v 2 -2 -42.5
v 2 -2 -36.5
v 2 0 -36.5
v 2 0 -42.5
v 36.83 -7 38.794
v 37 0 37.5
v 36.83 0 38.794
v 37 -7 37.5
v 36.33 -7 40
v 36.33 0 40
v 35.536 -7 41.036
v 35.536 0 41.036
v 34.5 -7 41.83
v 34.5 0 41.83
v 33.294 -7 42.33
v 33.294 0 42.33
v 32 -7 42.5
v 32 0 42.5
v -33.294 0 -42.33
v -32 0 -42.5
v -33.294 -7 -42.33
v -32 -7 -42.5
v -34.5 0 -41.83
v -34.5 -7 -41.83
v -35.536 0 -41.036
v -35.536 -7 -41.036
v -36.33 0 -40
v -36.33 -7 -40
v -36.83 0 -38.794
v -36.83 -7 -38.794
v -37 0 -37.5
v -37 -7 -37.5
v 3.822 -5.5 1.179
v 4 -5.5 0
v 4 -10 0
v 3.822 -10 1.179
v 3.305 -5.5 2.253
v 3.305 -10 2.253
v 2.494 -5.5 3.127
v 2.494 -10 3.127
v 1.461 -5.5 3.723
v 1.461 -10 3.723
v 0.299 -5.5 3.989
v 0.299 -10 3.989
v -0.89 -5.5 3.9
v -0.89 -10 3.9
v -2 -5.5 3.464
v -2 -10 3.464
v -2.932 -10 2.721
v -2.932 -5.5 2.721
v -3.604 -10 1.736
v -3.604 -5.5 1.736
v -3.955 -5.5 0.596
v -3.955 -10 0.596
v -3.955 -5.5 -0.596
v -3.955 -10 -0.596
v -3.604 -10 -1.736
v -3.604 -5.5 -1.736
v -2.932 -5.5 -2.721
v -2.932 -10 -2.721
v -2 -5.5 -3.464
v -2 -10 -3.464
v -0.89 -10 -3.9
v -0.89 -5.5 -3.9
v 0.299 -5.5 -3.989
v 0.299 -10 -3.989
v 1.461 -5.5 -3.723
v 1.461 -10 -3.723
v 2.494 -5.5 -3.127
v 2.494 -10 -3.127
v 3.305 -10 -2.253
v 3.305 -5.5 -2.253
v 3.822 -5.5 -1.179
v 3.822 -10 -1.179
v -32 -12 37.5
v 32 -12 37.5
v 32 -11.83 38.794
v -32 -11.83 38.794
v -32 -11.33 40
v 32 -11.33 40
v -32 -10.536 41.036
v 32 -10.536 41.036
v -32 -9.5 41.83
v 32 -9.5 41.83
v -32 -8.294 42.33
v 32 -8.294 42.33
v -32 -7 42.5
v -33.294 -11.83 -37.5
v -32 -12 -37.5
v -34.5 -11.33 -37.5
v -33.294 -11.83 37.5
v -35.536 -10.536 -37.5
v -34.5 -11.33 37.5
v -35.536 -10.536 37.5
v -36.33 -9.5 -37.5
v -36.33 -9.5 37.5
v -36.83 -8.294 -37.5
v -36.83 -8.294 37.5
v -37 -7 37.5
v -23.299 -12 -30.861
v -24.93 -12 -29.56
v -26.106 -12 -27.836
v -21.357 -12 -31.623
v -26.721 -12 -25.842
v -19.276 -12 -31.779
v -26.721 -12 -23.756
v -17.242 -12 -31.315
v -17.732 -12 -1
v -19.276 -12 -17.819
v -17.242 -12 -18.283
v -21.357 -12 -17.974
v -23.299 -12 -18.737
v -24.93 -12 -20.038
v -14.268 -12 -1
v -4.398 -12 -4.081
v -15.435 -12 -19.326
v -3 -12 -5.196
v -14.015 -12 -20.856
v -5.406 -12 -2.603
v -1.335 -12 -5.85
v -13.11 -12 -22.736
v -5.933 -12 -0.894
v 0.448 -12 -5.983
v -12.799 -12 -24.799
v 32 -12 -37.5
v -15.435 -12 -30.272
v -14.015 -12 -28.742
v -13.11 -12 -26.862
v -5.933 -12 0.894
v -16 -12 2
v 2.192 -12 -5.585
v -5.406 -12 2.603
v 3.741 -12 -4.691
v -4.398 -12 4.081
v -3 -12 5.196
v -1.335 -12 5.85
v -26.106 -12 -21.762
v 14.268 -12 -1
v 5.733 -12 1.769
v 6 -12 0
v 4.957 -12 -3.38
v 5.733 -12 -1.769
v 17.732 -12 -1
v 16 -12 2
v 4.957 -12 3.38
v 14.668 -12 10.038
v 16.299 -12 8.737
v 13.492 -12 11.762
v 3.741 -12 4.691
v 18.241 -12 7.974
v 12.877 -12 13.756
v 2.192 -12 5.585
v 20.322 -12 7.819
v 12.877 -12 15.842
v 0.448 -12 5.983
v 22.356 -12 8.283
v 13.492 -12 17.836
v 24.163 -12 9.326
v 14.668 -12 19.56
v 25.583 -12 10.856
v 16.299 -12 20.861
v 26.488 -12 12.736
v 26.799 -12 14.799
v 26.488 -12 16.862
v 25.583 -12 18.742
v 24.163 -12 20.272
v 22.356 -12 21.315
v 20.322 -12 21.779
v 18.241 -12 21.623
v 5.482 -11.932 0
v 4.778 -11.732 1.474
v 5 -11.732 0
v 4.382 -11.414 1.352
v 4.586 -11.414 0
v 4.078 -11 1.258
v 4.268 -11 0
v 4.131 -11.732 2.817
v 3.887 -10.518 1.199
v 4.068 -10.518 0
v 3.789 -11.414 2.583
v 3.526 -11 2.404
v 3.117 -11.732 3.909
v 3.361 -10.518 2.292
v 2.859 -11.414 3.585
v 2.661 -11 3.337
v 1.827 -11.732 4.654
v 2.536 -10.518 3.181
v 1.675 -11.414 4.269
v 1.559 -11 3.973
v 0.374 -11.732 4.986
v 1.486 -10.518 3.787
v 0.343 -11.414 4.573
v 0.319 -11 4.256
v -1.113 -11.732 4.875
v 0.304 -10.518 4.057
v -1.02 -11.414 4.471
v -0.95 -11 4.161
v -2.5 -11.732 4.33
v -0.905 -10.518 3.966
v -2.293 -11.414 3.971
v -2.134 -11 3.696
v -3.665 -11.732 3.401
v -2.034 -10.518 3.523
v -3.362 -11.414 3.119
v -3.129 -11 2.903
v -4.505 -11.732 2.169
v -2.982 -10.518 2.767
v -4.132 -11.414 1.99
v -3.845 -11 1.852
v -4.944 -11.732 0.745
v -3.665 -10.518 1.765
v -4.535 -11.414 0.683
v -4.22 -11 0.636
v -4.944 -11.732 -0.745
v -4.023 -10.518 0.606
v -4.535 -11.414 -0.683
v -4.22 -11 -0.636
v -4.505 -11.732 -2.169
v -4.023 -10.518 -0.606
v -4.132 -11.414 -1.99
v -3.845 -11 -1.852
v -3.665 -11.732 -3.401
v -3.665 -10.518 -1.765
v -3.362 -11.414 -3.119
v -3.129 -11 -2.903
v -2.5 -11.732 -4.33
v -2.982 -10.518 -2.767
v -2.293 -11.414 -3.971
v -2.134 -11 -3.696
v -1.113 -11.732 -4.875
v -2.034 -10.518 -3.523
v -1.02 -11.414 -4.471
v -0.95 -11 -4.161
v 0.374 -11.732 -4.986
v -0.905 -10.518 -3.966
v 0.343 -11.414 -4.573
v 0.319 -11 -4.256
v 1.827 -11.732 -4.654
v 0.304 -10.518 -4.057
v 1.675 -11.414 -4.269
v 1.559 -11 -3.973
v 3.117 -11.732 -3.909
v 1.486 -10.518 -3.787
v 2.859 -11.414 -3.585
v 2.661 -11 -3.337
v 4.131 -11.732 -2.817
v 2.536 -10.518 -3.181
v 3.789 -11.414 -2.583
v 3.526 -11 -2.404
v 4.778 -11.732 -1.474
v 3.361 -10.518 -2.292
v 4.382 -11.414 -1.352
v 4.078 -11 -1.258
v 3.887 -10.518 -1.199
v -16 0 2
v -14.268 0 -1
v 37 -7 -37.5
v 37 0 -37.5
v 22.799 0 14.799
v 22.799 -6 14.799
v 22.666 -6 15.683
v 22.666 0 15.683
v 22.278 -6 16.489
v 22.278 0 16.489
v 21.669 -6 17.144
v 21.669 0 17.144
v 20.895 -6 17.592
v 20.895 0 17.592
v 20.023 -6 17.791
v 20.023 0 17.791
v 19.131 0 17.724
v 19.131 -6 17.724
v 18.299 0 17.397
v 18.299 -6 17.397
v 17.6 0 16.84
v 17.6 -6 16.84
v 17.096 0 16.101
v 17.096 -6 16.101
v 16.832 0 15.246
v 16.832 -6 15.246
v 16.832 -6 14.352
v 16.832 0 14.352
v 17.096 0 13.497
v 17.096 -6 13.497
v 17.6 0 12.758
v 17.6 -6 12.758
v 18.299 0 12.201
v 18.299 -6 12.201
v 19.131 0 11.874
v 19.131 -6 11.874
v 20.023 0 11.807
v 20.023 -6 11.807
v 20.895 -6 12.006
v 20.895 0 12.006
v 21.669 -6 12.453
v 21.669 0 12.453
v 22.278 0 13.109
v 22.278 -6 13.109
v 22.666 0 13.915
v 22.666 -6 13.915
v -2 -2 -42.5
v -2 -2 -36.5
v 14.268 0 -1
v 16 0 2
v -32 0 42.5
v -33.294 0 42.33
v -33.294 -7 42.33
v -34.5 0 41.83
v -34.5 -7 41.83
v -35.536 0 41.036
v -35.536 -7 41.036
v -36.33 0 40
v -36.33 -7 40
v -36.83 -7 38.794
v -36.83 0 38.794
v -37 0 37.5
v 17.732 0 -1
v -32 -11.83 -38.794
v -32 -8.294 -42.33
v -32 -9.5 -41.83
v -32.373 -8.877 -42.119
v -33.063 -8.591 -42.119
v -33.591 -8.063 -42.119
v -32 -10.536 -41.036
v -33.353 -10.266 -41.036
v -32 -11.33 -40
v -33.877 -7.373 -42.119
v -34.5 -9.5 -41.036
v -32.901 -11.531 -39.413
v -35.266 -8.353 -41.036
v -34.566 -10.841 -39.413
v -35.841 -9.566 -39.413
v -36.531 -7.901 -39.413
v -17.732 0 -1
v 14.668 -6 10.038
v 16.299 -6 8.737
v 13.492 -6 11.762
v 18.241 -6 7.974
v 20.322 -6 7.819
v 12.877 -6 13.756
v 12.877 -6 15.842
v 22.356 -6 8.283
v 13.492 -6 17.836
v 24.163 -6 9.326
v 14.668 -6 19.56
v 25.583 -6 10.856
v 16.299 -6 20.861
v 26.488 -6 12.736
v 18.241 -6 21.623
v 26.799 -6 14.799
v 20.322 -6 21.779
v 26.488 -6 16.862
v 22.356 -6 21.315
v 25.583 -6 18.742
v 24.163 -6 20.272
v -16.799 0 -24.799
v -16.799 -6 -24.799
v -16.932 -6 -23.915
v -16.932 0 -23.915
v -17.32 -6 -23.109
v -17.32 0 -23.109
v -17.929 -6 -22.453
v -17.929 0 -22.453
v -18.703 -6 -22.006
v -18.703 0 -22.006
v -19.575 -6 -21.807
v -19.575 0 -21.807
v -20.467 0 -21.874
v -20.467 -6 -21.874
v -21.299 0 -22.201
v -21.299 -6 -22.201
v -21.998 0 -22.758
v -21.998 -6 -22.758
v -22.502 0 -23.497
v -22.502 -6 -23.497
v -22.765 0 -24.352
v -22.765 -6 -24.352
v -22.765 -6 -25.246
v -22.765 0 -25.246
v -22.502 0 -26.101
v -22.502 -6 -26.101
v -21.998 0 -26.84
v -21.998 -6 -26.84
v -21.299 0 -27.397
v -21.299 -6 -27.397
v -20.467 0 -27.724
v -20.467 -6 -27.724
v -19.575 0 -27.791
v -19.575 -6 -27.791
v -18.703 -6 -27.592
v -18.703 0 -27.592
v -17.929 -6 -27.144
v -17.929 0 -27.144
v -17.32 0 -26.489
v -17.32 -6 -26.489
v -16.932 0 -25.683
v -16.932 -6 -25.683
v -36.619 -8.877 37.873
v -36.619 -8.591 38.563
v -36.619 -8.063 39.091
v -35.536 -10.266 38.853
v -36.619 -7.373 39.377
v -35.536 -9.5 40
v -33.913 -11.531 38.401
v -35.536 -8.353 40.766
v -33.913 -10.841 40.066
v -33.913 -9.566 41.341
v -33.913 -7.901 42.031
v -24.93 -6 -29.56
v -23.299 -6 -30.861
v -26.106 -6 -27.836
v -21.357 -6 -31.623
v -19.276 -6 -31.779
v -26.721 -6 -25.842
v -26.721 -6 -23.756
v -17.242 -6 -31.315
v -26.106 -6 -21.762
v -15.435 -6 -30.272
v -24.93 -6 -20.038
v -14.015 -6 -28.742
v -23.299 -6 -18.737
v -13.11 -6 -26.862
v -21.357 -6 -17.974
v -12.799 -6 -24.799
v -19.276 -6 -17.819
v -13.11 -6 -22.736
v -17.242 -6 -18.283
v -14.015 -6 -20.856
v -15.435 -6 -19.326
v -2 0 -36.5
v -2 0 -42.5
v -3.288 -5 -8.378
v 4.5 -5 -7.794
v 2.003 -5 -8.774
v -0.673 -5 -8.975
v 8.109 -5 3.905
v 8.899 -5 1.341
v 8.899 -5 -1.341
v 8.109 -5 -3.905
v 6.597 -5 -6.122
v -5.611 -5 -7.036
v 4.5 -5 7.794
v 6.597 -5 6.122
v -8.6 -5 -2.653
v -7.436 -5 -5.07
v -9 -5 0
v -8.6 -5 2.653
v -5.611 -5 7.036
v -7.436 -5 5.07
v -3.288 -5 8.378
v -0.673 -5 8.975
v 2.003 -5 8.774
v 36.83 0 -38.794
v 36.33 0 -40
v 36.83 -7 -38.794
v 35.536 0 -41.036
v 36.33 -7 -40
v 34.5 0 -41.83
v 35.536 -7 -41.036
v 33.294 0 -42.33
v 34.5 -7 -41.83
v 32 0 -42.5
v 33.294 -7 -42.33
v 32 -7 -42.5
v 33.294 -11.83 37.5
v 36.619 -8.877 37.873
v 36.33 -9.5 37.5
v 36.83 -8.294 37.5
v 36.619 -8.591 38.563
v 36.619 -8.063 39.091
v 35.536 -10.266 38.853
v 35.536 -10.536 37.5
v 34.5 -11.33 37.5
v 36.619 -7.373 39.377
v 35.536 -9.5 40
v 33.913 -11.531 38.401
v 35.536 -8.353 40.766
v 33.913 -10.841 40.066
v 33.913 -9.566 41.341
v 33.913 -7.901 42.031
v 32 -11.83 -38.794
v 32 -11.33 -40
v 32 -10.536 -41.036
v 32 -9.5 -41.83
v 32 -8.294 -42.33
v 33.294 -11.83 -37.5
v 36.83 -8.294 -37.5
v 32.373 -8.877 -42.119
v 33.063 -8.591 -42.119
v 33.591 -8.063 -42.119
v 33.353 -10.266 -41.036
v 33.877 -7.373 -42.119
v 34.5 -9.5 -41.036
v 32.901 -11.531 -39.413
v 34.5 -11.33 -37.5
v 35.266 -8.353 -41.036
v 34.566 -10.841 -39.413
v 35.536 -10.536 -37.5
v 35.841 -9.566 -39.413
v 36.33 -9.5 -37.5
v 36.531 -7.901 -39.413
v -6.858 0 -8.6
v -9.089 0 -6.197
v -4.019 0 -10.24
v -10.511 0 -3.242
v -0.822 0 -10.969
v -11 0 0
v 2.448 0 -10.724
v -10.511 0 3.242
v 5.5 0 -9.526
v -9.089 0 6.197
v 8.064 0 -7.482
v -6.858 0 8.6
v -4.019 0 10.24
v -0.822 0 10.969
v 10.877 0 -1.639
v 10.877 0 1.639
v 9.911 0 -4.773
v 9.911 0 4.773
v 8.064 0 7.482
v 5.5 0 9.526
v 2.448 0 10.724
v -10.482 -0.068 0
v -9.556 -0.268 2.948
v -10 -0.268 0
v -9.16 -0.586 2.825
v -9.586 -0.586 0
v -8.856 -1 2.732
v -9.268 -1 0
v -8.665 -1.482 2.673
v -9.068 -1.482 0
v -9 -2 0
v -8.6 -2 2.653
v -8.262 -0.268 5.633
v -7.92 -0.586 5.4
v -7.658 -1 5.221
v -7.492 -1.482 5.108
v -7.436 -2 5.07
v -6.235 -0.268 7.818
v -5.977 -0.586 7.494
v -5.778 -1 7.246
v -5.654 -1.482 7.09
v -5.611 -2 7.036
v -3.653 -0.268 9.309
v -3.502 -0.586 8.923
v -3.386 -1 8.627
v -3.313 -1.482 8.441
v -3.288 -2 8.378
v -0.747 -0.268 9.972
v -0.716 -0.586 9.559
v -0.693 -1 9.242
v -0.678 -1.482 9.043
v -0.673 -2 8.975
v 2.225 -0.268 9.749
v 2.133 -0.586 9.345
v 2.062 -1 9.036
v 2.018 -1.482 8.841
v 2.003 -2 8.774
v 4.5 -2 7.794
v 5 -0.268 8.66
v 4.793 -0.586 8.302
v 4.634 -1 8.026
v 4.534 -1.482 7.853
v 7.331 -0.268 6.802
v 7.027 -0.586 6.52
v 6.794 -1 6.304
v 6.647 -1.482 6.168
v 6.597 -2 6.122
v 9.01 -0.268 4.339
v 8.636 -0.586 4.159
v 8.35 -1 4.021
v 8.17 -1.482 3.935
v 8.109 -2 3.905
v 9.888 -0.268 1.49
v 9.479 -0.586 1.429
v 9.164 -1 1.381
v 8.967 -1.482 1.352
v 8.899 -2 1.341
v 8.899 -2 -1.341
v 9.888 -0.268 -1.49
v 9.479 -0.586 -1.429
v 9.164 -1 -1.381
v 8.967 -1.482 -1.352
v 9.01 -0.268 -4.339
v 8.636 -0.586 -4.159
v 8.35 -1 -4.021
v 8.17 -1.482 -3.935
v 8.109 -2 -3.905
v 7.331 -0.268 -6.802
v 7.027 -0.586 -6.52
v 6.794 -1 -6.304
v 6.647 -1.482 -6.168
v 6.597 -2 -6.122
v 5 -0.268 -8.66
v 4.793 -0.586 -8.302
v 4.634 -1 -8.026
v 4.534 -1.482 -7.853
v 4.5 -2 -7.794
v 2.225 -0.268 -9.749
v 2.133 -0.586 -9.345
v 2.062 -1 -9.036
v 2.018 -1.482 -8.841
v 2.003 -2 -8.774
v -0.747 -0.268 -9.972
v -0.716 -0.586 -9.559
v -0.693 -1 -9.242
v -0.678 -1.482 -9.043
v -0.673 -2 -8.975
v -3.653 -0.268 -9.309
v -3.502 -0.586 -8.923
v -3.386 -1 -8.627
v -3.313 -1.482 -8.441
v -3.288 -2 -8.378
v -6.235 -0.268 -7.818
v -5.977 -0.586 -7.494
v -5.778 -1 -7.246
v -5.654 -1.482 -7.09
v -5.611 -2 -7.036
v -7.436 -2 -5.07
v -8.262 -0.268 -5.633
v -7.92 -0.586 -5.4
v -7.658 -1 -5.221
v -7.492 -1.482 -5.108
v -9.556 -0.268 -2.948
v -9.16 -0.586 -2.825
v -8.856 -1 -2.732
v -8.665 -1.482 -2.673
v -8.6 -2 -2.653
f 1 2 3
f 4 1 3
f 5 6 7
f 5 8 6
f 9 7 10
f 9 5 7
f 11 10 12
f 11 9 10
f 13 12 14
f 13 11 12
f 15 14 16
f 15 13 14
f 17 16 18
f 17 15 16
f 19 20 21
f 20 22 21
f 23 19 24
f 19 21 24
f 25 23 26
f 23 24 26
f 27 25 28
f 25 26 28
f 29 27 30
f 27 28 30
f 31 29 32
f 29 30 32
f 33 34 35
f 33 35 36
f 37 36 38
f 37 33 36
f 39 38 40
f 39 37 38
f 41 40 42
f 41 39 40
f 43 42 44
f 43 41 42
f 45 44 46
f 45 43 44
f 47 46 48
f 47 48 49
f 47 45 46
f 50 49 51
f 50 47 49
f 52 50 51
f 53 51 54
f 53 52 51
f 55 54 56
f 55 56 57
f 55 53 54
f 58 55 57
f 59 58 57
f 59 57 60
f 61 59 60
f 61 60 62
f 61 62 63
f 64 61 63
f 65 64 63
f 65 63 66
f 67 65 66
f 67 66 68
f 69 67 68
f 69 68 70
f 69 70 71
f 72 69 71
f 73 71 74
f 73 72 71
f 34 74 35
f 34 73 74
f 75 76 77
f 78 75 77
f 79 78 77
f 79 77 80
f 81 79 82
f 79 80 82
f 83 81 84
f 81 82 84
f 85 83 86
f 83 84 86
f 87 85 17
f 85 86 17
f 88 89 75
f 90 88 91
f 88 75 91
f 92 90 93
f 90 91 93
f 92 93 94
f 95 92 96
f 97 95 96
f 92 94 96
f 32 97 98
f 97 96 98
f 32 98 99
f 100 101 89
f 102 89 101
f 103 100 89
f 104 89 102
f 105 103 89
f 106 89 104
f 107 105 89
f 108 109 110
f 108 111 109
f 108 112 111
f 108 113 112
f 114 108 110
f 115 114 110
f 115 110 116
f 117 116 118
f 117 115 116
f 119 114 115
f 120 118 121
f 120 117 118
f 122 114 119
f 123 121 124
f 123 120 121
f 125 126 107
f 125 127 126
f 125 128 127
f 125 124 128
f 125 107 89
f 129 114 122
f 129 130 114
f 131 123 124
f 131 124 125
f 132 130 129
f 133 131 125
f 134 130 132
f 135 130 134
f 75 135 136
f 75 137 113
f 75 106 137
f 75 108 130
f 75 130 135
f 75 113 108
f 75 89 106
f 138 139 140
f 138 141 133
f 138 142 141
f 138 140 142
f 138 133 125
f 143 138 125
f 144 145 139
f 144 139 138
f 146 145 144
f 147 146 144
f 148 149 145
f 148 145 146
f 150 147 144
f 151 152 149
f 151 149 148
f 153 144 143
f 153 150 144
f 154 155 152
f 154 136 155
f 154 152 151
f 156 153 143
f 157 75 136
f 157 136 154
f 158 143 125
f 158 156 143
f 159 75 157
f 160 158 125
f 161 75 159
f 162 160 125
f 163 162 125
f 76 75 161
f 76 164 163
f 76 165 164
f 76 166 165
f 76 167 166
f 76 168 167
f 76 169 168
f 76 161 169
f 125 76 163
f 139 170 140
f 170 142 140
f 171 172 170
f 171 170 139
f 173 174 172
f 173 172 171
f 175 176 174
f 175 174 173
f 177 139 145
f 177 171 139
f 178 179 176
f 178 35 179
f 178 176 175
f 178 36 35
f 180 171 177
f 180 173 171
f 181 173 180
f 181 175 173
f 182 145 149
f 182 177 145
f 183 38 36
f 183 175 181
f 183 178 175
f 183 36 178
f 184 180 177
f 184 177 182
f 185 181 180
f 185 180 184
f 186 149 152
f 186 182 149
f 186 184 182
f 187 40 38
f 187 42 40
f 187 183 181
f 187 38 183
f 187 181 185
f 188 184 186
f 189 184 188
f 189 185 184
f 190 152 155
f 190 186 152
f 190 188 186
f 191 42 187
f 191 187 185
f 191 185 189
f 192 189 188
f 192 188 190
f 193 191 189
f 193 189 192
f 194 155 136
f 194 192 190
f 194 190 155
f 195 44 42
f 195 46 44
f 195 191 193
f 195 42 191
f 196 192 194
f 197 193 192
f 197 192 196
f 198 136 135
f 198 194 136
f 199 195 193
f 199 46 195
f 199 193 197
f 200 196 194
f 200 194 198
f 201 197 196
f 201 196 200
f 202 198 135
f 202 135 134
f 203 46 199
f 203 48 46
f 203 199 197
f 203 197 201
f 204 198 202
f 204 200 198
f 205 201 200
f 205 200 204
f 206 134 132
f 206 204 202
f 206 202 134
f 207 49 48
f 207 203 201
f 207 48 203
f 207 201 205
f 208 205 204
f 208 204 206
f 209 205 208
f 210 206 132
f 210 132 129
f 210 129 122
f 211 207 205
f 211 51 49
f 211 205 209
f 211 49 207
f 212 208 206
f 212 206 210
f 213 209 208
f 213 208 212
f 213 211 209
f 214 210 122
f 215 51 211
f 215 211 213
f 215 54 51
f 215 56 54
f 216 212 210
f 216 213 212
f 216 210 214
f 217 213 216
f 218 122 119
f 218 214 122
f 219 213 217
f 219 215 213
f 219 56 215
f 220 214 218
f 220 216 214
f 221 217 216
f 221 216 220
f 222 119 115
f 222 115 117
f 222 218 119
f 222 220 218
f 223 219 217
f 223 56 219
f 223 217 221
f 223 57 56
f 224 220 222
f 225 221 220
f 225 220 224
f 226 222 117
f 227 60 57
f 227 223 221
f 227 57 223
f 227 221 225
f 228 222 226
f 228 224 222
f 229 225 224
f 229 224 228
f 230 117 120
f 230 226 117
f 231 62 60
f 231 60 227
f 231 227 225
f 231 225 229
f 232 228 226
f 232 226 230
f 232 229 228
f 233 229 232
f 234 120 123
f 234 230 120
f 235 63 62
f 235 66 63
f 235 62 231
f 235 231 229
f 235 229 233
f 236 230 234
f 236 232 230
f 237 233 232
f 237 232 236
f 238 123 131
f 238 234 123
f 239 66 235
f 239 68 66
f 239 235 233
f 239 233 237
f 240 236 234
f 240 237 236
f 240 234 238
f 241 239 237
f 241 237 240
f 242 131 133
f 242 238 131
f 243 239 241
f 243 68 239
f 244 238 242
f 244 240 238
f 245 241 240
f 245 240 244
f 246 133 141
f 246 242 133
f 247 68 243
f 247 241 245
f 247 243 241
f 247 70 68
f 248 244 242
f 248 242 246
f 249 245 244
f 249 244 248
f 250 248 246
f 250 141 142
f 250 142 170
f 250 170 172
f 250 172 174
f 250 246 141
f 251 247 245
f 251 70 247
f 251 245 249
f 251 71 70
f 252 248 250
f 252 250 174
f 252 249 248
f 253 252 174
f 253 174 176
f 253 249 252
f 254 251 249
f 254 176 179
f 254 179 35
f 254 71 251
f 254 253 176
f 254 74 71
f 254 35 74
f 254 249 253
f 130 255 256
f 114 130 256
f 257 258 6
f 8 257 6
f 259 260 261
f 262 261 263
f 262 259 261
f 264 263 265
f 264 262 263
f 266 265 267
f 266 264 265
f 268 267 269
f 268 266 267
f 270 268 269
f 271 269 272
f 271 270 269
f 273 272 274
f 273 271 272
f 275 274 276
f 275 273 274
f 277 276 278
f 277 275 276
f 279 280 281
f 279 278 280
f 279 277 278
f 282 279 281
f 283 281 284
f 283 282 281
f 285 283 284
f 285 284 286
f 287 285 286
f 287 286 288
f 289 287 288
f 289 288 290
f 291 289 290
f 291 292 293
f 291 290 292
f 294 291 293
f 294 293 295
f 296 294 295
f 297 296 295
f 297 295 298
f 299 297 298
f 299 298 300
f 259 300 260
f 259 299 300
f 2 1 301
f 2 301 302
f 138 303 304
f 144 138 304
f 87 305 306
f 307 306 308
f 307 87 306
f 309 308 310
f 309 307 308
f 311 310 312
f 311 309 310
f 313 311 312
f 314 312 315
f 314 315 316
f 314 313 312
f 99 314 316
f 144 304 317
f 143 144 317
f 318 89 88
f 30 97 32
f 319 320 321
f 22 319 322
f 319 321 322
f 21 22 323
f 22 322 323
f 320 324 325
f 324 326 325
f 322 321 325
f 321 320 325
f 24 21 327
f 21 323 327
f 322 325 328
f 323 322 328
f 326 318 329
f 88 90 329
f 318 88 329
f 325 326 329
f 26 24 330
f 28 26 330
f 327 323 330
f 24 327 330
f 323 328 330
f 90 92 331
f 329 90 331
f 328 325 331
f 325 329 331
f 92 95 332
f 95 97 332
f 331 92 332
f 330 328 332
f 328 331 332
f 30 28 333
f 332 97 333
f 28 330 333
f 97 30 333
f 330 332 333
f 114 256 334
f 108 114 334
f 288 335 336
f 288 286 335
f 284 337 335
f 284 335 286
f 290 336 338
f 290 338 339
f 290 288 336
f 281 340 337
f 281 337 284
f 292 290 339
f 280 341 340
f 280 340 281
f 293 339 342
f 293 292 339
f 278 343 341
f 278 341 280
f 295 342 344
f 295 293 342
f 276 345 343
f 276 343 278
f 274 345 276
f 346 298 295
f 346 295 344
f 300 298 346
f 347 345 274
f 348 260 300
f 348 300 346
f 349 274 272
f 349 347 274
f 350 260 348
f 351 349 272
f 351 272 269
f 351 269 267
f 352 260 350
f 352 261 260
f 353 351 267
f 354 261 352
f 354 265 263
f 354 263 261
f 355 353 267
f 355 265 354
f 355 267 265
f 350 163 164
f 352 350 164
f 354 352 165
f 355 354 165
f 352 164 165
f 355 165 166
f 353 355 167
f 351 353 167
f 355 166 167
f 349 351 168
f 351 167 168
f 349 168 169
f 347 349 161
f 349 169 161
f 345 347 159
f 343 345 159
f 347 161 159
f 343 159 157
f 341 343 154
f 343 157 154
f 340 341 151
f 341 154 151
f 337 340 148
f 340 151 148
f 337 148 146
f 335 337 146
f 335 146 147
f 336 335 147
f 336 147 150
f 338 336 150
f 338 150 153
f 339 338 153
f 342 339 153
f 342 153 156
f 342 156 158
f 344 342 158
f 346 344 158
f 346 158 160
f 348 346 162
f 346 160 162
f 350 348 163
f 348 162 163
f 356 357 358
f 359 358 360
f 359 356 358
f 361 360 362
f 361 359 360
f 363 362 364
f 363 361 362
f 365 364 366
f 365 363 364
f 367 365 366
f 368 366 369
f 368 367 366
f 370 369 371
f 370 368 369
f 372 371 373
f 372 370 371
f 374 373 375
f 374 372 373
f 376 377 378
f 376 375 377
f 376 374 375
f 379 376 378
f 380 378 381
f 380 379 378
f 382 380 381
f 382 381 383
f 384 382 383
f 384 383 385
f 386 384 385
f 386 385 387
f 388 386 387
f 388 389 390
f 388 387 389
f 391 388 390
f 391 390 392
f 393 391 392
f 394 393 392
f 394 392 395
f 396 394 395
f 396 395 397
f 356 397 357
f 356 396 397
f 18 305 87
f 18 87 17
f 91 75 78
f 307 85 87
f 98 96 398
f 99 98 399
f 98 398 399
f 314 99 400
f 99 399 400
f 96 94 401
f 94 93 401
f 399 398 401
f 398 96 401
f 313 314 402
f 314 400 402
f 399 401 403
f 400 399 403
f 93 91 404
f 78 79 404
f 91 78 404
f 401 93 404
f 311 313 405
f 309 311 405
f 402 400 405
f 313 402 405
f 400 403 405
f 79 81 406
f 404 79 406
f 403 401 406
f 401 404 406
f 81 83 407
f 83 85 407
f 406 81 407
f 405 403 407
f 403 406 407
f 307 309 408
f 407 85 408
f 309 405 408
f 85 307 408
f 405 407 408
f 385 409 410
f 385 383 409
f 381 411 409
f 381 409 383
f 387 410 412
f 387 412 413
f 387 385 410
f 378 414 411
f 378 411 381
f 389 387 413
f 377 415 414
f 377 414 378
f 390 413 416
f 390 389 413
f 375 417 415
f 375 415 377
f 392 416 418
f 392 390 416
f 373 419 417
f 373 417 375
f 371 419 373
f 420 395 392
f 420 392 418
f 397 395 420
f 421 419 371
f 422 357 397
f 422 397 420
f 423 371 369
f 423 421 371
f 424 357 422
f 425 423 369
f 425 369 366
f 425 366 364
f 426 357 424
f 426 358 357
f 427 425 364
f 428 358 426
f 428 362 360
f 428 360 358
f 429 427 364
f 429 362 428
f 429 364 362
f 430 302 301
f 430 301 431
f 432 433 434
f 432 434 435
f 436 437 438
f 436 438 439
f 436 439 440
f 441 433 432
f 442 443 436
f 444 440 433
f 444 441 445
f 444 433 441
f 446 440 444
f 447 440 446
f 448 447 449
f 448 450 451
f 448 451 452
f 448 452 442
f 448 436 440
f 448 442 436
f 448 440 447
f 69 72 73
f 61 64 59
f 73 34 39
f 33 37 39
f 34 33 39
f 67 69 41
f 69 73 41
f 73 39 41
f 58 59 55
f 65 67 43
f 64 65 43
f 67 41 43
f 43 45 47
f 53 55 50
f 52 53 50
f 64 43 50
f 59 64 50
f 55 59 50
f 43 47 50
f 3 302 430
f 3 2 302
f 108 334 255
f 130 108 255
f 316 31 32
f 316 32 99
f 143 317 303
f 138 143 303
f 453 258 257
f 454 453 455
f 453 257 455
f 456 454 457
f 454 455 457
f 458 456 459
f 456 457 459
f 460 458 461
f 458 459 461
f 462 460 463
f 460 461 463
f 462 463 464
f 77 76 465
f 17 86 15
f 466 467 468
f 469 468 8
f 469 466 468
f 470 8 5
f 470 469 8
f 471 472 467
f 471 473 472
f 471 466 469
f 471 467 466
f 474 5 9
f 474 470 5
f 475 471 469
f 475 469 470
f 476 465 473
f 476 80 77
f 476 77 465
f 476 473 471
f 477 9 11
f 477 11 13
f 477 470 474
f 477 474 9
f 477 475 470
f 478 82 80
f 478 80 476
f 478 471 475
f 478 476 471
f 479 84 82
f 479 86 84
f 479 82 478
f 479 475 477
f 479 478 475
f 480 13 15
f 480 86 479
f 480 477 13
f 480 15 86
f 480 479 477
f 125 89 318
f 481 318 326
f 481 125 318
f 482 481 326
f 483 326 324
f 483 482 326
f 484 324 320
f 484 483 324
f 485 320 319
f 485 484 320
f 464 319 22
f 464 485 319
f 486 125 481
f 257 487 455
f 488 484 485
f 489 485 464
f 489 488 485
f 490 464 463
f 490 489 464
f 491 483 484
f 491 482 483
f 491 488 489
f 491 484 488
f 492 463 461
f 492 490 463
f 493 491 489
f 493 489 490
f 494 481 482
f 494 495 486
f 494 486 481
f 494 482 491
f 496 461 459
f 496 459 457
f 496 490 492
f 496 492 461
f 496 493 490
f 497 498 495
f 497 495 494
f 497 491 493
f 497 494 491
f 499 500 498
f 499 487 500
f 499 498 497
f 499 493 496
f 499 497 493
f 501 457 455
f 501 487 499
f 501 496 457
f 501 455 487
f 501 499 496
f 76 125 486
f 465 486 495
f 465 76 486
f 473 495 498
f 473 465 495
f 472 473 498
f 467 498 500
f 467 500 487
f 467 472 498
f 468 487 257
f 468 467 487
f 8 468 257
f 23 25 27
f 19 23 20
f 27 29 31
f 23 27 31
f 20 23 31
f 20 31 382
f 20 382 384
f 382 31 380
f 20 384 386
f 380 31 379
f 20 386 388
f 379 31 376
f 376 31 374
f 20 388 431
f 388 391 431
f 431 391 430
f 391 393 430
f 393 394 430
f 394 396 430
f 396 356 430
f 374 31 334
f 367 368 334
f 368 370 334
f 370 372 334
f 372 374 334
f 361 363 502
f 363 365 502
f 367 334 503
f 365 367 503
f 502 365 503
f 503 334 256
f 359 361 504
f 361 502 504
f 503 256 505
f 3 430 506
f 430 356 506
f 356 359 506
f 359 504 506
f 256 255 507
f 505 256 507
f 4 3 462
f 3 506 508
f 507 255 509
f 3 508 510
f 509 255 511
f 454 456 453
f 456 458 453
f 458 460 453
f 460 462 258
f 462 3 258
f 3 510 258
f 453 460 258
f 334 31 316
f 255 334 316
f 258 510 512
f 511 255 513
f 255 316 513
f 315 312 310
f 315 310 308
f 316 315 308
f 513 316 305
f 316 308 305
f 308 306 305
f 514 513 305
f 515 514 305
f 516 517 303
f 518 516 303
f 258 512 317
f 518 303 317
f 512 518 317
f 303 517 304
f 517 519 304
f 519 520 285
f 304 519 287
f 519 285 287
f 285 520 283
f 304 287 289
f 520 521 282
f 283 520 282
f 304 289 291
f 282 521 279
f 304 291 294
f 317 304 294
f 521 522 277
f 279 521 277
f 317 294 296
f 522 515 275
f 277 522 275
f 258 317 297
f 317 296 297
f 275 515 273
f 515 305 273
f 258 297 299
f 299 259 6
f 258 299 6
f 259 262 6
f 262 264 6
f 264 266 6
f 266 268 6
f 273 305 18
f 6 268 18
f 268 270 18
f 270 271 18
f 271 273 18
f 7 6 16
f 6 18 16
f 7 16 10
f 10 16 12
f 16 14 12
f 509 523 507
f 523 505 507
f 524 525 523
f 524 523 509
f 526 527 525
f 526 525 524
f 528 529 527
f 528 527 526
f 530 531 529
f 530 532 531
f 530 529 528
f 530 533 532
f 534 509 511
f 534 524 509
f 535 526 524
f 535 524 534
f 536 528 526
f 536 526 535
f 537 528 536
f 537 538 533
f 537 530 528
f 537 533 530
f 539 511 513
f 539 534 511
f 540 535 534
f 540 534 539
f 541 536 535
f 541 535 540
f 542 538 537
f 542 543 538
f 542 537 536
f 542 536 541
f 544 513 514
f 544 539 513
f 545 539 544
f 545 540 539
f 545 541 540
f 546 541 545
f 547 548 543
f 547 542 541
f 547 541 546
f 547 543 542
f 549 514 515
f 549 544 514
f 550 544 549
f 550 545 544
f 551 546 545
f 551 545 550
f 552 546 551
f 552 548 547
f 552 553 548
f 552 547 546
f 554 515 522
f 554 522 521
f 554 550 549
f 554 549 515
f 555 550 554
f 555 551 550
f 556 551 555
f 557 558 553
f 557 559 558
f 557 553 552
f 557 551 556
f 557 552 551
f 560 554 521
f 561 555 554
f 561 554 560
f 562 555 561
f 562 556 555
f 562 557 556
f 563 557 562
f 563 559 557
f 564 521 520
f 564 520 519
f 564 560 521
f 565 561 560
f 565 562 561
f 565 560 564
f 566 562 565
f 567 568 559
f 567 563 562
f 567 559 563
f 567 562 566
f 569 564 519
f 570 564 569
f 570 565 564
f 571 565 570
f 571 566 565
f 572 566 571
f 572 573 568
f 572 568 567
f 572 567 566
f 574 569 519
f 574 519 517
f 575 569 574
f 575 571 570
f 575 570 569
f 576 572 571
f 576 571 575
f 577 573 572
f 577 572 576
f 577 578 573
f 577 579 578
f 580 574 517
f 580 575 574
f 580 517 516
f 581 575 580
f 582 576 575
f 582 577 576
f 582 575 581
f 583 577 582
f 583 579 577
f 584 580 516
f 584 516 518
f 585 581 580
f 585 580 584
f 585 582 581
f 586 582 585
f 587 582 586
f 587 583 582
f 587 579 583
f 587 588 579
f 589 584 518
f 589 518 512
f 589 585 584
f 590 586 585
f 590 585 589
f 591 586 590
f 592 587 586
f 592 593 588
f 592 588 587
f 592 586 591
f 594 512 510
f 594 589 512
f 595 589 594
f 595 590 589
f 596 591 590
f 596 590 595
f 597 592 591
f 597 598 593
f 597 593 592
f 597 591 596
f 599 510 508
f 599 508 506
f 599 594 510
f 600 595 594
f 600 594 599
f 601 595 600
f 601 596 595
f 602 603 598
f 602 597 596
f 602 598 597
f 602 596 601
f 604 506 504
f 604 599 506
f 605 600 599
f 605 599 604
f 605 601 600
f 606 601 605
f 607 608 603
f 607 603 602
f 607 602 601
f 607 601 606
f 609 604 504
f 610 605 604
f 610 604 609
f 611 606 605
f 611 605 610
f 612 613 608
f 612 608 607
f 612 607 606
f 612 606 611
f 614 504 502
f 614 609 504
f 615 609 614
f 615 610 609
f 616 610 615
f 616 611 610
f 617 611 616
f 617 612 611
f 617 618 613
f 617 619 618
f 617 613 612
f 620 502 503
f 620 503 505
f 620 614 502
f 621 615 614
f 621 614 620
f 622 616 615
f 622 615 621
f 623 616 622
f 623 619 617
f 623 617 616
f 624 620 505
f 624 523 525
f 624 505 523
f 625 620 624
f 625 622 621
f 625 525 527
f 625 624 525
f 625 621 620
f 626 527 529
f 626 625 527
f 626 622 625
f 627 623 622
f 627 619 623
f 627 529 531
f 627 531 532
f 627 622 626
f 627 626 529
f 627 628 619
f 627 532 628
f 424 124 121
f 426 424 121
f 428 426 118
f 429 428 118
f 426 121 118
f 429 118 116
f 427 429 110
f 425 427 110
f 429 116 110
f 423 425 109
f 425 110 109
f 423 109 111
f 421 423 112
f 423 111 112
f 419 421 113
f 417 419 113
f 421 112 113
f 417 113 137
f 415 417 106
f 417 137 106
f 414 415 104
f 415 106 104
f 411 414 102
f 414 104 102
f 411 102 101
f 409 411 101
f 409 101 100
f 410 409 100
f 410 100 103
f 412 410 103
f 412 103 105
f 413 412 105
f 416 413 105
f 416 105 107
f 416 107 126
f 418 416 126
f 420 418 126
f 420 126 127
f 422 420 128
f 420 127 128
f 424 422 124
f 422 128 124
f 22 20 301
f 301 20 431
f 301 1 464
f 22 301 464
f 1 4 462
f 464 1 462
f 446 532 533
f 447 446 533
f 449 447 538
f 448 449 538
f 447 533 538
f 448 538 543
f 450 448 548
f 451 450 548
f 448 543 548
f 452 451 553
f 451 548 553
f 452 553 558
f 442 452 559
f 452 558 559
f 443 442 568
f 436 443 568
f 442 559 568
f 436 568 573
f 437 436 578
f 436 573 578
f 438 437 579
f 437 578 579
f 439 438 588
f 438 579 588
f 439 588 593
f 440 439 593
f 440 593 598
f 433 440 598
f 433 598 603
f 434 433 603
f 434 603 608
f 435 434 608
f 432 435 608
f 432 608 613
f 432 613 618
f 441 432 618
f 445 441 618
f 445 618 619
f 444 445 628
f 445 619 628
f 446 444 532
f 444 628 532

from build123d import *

# Parameters (mm, degrees)
F0_W     = 74
F0_H     = 85
F0_R     = 3
F0_R_2   = 4
F1_DEPTH = 12
F2_R     = 7
F3_DEPTH = 6
F4_W     = 2
F4_H     = 6
F5_DEPTH = 2
F6_R     = 9
F7_DEPTH = 5
F8_R     = 4
F9_DEPTH = 0.5
F10_R    = 5
F11_R    = 2


with BuildPart() as f1:
    # F0 (on Front) → F1 (new body)
    with BuildSketch(Plane.XZ):
        Rectangle(F0_W, F0_H)
        with Locations((-19.7989898732, -24.7989898732)):
            Circle(F0_R, mode=Mode.SUBTRACT)
        Polygon((-17.7320508076, -1), (-16, 2), (-14.2679491924, -1), align=None, mode=Mode.SUBTRACT)
        Circle(F0_R_2, mode=Mode.SUBTRACT)
        Polygon((14.2679491924, -1), (16, 2), (17.7320508076, -1), align=None, mode=Mode.SUBTRACT)
        with Locations((19.7989898732, 14.7989898732)):
            Circle(F0_R, mode=Mode.SUBTRACT)
    extrude(amount=F1_DEPTH)

    # F2 (on face) → F3 (cut)
    with BuildSketch(Plane.XZ.offset(12)):
        with Locations((19.7989898732, 14.7989898732)):
            Circle(F2_R)
        with Locations((-19.7989898732, -24.7989898732)):
            Circle(F2_R)
    extrude(amount=-F3_DEPTH, mode=Mode.SUBTRACT)

    # F4 (on Right) → F5 (cut, symmetric)
    with BuildSketch(Plane.YZ):
        with Locations((-1, -39.5)):
            Rectangle(F4_W, F4_H)
    extrude(amount=F5_DEPTH, both=True, mode=Mode.SUBTRACT)

    # F6 (on face) → F7 (cut)
    with BuildSketch(Plane(origin=(0, 0, 0), x_dir=(-1, 0, 0), z_dir=(0, 1, 0))):
        Circle(F6_R)
    extrude(amount=-F7_DEPTH, mode=Mode.SUBTRACT)

    # F8 (on face) → F9 (join)
    with BuildSketch(Plane(origin=(0, -5, 0), x_dir=(-1, 0, 0), z_dir=(0, 1, 0))):
        Circle(F8_R)
    extrude(amount=-F9_DEPTH)

    # F10
    f10_edges = [f1.edges().sort_by_distance(p)[0] for p in [
        (0, -12, 42.5),
        (-37, -12, 0),
        (37, -12, 0),
        (0, -12, -42.5),
        (37, -6, -42.5),
        (37, -6, 42.5),
        (-37, -6, 42.5),
        (-37, -6, -42.5),
    ]]
    fillet(f10_edges, radius=F10_R)

    # F11
    f11_edges = [f1.edges().sort_by_distance(p)[0] for p in [
        (9, 0, 0),
        (-4, -12, 0),
    ]]
    fillet(f11_edges, radius=F11_R)


solid = f1.part
